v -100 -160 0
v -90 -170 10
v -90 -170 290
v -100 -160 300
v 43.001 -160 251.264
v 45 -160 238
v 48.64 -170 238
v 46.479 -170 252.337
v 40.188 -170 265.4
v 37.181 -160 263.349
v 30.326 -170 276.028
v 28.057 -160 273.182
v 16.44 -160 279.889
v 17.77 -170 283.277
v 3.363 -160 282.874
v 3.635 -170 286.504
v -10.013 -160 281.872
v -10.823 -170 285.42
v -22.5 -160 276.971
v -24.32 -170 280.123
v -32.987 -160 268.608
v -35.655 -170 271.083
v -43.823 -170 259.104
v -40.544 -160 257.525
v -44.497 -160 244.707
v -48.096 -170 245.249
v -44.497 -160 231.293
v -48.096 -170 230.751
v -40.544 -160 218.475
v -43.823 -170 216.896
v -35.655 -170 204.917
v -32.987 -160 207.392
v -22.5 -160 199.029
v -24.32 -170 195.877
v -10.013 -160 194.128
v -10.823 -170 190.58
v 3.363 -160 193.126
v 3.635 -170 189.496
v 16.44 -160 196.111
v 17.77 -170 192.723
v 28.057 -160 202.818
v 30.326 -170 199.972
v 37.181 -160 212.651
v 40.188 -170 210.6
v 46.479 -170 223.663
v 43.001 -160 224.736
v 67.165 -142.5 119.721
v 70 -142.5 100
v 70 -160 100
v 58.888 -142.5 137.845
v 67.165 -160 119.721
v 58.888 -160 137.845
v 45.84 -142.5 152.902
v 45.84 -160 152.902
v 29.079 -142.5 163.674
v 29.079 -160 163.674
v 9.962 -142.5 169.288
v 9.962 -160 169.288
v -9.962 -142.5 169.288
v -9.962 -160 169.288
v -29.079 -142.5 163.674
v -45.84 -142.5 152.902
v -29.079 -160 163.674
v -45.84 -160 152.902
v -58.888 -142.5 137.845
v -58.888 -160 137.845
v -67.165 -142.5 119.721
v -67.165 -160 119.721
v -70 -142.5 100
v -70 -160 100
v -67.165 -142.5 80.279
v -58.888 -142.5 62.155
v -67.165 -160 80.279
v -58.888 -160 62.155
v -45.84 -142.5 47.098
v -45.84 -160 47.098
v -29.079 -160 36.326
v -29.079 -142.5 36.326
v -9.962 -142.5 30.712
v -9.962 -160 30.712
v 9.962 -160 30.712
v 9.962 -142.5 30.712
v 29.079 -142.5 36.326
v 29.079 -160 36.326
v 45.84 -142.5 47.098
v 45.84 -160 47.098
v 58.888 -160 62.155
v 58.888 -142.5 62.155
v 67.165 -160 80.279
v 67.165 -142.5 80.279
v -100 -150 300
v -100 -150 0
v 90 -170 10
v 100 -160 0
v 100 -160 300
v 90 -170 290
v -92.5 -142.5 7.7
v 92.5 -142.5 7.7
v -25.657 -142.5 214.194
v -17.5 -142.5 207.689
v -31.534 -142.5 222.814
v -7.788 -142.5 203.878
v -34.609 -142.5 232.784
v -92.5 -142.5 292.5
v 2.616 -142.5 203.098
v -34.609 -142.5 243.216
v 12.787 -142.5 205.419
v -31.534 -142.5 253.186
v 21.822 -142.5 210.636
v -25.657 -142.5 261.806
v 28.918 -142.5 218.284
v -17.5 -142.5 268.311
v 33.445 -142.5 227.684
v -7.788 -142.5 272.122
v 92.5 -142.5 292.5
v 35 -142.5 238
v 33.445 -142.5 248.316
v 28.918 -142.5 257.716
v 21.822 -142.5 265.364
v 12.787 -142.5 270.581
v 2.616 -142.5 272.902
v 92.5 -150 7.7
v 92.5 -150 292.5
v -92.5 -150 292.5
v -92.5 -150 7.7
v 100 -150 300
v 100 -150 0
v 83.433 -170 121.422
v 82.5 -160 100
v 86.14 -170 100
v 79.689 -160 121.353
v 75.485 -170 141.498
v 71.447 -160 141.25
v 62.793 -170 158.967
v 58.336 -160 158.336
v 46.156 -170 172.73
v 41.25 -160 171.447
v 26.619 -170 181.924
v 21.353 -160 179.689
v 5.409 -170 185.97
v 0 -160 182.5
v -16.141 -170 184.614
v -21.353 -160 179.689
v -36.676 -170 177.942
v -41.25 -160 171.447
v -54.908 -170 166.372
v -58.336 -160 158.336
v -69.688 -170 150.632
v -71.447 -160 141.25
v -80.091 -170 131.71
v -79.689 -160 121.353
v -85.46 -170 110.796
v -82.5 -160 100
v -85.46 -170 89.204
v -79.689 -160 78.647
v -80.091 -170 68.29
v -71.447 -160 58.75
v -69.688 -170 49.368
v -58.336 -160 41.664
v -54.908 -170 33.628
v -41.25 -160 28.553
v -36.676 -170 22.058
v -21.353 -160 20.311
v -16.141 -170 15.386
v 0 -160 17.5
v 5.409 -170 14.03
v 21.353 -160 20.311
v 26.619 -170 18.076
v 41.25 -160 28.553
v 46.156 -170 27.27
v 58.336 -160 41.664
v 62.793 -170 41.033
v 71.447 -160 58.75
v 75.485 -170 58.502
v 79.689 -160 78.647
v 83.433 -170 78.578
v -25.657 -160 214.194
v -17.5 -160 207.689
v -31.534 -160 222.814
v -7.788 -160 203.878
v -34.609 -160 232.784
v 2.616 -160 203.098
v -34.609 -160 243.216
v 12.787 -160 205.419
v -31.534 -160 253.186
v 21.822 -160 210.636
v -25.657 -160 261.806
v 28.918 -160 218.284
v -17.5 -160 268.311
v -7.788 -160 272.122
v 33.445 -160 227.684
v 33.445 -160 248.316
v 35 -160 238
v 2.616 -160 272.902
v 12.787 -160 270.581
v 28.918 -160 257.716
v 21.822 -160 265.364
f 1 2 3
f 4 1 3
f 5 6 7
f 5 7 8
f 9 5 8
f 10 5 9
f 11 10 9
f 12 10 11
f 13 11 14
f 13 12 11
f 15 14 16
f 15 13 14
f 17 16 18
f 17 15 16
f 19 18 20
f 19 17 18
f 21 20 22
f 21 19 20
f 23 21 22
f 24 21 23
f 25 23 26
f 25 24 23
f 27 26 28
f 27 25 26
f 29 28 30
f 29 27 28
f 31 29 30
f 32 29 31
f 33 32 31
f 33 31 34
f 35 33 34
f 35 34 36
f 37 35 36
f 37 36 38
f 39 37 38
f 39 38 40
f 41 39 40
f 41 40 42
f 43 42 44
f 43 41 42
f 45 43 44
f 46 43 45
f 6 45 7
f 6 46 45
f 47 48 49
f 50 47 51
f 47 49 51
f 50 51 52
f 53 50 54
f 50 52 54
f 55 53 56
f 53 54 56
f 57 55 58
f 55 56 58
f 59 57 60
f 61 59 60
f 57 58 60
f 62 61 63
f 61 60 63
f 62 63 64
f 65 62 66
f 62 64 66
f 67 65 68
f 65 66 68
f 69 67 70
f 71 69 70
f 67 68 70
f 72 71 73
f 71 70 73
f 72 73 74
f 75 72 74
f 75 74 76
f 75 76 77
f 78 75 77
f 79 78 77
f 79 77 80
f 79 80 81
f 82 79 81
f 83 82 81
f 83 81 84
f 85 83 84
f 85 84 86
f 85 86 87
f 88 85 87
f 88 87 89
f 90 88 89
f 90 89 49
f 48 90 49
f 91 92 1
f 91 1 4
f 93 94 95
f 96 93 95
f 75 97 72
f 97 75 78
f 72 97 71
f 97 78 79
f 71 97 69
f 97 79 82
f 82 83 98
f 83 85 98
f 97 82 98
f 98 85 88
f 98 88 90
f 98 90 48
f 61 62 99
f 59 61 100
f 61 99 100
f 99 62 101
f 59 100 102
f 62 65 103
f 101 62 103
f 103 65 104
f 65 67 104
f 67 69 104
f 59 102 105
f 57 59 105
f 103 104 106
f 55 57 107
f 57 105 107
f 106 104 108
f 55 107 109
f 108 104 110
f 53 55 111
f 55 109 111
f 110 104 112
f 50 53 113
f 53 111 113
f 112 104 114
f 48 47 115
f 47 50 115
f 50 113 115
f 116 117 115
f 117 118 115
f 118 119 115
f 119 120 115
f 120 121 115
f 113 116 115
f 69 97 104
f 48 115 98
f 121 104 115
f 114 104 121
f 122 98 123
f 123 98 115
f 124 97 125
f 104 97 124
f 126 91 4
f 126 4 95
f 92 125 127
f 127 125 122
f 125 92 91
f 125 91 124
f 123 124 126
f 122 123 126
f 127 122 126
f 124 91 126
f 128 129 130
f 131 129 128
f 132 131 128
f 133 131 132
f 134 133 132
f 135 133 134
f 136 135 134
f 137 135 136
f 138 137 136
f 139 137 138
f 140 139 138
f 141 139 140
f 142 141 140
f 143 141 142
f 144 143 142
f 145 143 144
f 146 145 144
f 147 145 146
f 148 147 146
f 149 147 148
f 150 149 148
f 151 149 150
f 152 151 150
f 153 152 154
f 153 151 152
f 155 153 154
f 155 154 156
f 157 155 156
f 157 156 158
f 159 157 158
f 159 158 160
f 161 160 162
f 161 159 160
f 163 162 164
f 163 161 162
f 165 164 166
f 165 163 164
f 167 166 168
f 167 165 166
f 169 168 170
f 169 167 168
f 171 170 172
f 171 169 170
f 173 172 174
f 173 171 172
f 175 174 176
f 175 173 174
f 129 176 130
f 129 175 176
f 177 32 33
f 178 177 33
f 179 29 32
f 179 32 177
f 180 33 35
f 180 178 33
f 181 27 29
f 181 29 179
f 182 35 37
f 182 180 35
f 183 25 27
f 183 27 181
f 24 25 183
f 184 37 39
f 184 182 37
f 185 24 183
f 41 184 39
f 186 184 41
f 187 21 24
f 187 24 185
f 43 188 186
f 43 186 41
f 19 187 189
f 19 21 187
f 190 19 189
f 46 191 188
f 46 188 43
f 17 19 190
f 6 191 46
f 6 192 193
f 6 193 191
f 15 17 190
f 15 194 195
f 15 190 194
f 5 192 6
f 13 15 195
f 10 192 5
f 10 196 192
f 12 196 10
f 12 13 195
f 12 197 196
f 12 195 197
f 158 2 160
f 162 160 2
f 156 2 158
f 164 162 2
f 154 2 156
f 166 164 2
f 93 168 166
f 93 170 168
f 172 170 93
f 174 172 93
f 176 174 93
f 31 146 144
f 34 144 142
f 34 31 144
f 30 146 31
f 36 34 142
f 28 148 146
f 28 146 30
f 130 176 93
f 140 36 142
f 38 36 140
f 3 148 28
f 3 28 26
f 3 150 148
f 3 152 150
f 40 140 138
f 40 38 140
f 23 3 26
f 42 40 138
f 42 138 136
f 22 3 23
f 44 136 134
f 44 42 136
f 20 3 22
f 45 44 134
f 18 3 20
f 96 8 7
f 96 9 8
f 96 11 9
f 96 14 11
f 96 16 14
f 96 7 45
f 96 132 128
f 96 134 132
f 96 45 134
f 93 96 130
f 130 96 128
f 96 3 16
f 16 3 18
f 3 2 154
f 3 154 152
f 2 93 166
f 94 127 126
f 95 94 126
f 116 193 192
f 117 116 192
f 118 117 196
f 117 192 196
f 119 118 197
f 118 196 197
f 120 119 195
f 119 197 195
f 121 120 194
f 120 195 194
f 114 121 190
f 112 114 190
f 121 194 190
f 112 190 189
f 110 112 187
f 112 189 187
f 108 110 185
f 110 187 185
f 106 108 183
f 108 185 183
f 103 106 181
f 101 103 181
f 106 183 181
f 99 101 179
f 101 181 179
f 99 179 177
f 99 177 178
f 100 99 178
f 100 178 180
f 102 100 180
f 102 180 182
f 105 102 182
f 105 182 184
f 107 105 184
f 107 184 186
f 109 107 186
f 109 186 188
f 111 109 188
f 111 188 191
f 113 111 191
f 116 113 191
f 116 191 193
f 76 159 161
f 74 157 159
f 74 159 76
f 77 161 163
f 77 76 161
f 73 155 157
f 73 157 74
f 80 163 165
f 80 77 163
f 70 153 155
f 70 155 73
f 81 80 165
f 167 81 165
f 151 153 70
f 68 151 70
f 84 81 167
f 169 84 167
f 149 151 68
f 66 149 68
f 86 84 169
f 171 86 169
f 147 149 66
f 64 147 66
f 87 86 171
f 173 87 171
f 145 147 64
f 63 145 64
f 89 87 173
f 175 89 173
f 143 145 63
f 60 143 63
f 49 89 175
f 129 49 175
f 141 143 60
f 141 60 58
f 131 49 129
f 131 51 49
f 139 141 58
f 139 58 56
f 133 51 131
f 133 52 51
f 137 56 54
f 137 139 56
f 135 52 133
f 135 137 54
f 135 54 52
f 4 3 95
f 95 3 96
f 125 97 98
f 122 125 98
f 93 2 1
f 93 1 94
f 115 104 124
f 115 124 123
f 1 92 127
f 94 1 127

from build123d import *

# Parameters (mm, degrees)
F9_W      = 185
F9_H      = 284.8
F10_DEPTH = 7.5
F11_W     = 200
F11_H     = 300
F12_DEPTH = 20
F16_R     = 70
F17_DEPTH = 157.5
F18_R     = 82.5
F19_DEPTH = 140
F20_R     = 35
F21_DEPTH = 157.5
F22_R     = 45
F23_DEPTH = 140
F13_W     = 40
F13_H     = 300
F24_DEPTH = 200
F25_SIZE  = 10
F26_SIZE2 = 9.99999
F26_SIZE  = 3.639692
F27_SIZE2 = 9.99999
F27_SIZE  = 3.639692


# Not quite as in the source:
# - a fillet or chamfer is up to 0.001 mm smaller than in the source, because OpenCascade refuses the exact size


with BuildPart() as f10:
    # F9 (on offset) → F10 (new body)
    with BuildSketch(Plane.XZ.offset(142.5)):
        with Locations((0, 150.1)):
            Rectangle(F9_W, F9_H)
    extrude(amount=F10_DEPTH)

    # F11 (on offset) → F12 (join)
    with BuildSketch(Plane.XZ.offset(150)):
        with Locations((0, 150)):
            Rectangle(F11_W, F11_H)
    extrude(amount=F12_DEPTH)

    # F16 (on offset) → F17 (cut, through all)
    with BuildSketch(Plane.XZ.offset(300)):
        with Locations((0, 100)):
            Circle(F16_R)
    extrude(amount=-F17_DEPTH, mode=Mode.SUBTRACT)

    # F18 (on offset) → F19 (cut, through all)
    with BuildSketch(Plane.XZ.offset(300)):
        with Locations((0, 100)):
            Circle(F18_R)
    extrude(amount=-F19_DEPTH, mode=Mode.SUBTRACT)

    # F20 (on offset) → F21 (cut, through all)
    with BuildSketch(Plane.XZ.offset(300)):
        with Locations((0, 238)):
            Circle(F20_R)
    extrude(amount=-F21_DEPTH, mode=Mode.SUBTRACT)

    # F22 (on offset) → F23 (cut, through all)
    with BuildSketch(Plane.XZ.offset(300)):
        with Locations((0, 238)):
            Circle(F22_R)
    extrude(amount=-F23_DEPTH, mode=Mode.SUBTRACT)

    # F13 (on offset) → F24 (cut, through all)
    with BuildSketch(Plane.YZ.offset(100)):
        with Locations((-200, 150)):
            Rectangle(F13_W, F13_H)
    extrude(amount=-F24_DEPTH, mode=Mode.SUBTRACT)

    # F25
    f25_edges = [f10.edges().sort_by_distance(p)[0] for p in [
        (100, -170, 150),
        (0, -170, 300),
        (-100, -170, 150),
        (0, -170, 0),
    ]]
    chamfer(f25_edges, length=F25_SIZE)

    # F26 (size 3.6397023427 and 10 in the source; OpenCascade refuses exactly that, so slightly less here)
    f26_edges = [f10.edges().sort_by_distance(p)[0] for p in [
        (-82.5, -170, 100),
    ]]
    f26_side = f10.faces().sort_by_distance((86.671337, -170, 150))[0]
    chamfer(f26_edges, length=F26_SIZE, length2=F26_SIZE2, reference=f26_side)

    # F27 (size 3.6397023427 and 10 in the source; OpenCascade refuses exactly that, so slightly less here)
    f27_edges = [f10.edges().sort_by_distance(p)[0] for p in [
        (-45, -170, 238),
    ]]
    f27_side = f10.faces().sort_by_distance((-89.468355, -170, 100))[0]
    chamfer(f27_edges, length=F27_SIZE, length2=F27_SIZE2, reference=f27_side)


solid = f10.part
